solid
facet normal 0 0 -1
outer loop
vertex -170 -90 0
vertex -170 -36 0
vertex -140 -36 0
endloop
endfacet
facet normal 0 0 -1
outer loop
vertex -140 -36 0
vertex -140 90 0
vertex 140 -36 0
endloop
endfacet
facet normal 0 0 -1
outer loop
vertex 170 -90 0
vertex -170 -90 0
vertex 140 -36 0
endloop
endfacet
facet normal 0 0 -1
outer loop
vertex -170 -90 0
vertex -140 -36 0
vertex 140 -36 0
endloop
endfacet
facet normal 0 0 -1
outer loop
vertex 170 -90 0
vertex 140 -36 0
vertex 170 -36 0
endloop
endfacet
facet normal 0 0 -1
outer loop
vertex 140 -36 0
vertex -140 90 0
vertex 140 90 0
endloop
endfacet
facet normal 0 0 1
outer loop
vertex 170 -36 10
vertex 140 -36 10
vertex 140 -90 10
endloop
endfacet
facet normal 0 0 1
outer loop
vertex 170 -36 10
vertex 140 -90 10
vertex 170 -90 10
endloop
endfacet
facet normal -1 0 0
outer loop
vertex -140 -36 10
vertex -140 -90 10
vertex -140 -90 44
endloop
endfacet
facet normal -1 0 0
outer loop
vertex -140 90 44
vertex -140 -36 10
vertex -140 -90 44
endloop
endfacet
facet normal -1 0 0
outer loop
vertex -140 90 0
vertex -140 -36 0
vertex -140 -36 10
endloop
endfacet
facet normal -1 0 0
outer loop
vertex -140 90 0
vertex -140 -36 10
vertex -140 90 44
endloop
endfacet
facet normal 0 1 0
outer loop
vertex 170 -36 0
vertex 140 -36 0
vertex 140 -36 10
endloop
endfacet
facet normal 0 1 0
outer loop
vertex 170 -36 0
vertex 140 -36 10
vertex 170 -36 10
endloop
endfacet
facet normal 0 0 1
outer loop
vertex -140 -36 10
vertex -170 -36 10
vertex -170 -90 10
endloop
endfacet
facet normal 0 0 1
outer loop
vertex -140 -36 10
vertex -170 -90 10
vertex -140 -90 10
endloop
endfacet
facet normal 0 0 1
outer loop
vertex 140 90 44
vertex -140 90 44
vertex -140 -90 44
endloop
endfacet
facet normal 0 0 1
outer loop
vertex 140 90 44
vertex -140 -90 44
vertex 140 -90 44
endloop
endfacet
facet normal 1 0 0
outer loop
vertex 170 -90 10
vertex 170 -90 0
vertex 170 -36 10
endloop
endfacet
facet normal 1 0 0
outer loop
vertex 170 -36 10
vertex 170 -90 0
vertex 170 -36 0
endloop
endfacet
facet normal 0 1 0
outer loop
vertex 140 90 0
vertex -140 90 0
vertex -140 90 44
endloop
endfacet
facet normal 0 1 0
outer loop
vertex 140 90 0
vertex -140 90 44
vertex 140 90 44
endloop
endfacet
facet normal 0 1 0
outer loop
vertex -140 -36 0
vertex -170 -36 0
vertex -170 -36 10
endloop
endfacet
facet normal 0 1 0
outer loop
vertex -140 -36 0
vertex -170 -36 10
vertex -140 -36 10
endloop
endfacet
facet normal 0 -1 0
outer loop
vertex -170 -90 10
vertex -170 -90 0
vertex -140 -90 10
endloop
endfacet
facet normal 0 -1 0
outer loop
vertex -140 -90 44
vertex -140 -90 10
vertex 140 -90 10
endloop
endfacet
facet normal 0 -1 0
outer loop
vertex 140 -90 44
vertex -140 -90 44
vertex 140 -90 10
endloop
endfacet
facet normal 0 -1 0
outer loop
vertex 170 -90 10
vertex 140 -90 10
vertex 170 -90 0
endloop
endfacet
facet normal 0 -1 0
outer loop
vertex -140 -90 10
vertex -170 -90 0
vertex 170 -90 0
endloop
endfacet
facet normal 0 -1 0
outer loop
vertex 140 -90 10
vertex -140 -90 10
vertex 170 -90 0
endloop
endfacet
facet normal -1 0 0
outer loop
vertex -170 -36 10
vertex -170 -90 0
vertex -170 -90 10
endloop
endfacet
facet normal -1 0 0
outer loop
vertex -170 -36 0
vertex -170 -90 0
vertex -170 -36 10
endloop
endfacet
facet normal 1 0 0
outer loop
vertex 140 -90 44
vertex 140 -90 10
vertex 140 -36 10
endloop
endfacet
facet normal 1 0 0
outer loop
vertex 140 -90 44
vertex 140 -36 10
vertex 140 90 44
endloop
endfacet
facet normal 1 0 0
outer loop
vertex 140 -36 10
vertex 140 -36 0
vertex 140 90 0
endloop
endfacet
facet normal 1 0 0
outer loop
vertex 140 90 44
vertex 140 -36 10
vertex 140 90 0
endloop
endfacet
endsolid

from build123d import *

# Parameters (mm, degrees)
SKETCH_W     = 280
SKETCH_H     = 180
PAD_DEPTH    = 44
SKETCH001_W  = 30
SKETCH001_H  = 54
PAD001_DEPTH = 10


with BuildPart() as pad:
    # Sketch → Pad (new body)
    with BuildSketch(Plane.XY):
        Rectangle(SKETCH_W, SKETCH_H)
    extrude(amount=PAD_DEPTH)


with BuildPart() as fusion:
    # Sketch001 → Pad001 (new body)
    with BuildSketch(Plane.XY):
        with Locations((155, -63)):
            Rectangle(SKETCH001_W, SKETCH001_H)
        with Locations((-155, -63)):
            Rectangle(SKETCH001_W, SKETCH001_H)
    extrude(amount=PAD001_DEPTH)

    # Fusion: union Pad
    add(pad.part)


solid = fusion.part
